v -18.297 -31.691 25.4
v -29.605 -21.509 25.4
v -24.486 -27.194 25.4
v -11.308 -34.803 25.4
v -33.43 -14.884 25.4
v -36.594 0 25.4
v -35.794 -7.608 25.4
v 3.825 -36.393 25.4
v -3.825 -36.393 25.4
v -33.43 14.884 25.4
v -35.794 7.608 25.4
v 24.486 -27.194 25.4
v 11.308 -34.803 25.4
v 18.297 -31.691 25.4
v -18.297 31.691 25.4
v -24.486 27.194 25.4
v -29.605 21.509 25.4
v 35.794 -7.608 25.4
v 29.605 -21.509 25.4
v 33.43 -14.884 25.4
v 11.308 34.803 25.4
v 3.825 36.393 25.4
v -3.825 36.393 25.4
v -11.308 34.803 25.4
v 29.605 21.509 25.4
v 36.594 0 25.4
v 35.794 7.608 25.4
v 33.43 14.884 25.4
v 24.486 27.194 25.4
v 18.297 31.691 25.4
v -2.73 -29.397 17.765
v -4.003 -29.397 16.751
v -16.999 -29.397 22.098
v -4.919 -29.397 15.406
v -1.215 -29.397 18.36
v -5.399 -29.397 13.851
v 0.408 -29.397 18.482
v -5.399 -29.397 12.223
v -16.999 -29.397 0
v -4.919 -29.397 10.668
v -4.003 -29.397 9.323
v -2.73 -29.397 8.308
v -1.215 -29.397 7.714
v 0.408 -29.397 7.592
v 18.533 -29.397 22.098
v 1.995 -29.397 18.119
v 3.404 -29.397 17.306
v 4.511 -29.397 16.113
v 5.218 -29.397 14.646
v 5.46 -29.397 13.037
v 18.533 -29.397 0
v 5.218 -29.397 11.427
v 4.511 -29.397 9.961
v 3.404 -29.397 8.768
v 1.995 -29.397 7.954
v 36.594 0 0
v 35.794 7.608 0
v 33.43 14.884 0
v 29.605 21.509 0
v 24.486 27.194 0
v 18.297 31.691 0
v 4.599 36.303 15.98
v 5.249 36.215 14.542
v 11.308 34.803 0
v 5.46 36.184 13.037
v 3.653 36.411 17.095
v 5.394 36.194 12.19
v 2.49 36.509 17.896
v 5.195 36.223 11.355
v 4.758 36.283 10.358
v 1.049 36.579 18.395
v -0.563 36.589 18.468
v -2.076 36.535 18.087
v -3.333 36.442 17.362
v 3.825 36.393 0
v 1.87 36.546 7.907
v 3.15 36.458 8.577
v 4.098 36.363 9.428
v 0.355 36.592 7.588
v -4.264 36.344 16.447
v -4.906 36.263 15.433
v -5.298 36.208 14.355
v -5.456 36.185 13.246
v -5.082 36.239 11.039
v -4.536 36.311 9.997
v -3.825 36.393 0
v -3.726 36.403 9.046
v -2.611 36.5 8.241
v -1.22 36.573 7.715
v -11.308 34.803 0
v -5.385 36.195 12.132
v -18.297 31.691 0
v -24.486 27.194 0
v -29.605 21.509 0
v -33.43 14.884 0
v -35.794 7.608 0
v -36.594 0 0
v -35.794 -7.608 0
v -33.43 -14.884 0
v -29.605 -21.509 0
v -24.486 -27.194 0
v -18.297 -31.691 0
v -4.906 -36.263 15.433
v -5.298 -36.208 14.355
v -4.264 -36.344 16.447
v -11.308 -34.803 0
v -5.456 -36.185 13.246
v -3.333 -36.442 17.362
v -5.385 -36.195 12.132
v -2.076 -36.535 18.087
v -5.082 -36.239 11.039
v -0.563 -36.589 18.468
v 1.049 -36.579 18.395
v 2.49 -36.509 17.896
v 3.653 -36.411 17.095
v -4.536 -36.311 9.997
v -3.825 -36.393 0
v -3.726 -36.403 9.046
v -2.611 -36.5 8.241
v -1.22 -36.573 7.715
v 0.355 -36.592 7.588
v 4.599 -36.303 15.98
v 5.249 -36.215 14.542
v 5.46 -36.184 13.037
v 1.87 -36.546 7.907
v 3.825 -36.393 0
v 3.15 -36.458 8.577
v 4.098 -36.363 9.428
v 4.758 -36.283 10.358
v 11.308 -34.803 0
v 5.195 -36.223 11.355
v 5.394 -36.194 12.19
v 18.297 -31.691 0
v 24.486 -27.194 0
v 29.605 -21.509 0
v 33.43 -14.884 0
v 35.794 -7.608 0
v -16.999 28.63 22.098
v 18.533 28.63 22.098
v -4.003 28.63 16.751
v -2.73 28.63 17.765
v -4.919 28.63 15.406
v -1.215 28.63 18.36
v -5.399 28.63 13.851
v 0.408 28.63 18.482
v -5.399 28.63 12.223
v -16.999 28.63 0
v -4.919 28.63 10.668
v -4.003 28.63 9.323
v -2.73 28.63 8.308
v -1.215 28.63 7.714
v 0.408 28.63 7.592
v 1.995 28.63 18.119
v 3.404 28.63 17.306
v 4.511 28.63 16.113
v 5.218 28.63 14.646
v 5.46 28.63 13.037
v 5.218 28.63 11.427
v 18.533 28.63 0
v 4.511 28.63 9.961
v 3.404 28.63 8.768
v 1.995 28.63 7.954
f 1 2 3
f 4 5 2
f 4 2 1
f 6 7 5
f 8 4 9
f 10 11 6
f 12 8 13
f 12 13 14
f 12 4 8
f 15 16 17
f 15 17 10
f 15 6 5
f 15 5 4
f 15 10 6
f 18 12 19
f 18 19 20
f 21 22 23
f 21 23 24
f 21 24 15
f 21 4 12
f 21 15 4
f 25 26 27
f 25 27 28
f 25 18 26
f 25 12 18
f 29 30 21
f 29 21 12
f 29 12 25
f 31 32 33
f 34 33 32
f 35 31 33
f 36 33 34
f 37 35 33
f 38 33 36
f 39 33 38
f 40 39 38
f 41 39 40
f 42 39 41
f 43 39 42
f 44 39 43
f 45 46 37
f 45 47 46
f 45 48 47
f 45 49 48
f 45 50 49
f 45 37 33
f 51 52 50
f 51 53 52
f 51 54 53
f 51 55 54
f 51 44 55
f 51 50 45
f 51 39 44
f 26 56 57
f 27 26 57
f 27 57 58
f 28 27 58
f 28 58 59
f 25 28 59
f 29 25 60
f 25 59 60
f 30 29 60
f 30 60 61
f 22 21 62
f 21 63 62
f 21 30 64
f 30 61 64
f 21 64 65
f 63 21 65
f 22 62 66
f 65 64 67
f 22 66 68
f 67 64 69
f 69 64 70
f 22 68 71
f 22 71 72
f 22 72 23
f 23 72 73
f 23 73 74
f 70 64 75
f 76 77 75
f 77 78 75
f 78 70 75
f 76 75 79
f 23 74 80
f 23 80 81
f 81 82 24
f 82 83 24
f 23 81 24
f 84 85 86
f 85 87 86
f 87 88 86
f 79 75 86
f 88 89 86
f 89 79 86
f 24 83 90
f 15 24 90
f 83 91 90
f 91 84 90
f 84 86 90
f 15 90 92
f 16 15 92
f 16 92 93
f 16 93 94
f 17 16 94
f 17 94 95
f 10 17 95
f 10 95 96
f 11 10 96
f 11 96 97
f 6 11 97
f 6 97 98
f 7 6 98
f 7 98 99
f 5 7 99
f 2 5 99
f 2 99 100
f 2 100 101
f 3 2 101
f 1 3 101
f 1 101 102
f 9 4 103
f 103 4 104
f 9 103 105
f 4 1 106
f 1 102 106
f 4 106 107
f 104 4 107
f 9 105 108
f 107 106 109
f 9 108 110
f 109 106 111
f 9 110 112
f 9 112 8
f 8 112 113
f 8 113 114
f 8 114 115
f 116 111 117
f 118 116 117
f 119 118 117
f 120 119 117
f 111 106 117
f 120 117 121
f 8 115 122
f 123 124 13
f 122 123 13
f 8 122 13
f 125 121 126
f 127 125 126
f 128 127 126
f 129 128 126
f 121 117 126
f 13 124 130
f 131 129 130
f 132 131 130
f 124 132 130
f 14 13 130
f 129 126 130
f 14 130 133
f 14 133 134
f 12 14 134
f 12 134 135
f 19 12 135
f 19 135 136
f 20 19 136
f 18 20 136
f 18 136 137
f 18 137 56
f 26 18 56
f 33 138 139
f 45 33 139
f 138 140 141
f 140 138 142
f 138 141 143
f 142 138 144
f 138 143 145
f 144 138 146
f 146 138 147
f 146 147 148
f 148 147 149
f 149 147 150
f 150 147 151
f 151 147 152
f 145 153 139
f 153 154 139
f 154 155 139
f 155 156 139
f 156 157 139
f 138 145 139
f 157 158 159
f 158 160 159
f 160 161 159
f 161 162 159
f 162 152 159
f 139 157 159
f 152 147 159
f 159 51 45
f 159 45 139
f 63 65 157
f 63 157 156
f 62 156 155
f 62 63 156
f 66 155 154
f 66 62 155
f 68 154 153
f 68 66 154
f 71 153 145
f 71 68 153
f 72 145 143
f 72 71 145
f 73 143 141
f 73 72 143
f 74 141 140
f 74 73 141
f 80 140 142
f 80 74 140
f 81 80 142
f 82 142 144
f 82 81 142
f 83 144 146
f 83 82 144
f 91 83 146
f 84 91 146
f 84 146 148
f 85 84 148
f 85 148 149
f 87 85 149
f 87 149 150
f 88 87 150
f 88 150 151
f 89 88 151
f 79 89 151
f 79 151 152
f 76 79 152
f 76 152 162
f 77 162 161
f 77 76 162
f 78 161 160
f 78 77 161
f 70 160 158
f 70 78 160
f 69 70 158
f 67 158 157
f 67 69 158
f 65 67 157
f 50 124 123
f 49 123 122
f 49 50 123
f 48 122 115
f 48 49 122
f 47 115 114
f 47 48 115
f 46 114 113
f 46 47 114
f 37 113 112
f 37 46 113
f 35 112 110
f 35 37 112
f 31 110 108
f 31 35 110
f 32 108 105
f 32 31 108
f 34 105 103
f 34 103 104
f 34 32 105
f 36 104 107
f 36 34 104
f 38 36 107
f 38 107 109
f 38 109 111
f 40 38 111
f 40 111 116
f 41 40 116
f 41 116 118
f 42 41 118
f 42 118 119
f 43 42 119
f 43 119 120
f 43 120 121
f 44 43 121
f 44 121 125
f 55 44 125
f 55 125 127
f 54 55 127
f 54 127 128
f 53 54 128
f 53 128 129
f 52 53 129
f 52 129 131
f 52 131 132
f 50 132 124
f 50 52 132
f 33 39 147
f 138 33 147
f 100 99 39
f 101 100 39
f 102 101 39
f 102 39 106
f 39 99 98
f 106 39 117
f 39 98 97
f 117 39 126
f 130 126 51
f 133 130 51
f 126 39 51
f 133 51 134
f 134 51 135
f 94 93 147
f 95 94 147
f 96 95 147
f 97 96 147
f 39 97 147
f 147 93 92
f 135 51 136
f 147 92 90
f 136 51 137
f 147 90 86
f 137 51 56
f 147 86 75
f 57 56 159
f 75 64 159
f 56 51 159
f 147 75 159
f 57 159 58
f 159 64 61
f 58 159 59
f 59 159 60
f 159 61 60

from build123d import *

# Parameters (mm, degrees)
F0_R     = 36.593619
F1_DEPTH = 25.4
F3_R     = 5.460111
F4_DEPTH = 76.708
F5_W     = 35.531597
F5_H     = 58.026424
F6_DEPTH = 22.098


with BuildPart() as f1:
    # F0 (on Top) → F1 (new body)
    with BuildSketch(Plane.XY):
        Circle(F0_R)
    extrude(amount=F1_DEPTH)

    # F3 (on offset) → F4 (cut)
    with BuildSketch(Plane.XZ.offset(-37.084)):
        with Locations((0, 13.036774)):
            Circle(F3_R)
    extrude(amount=F4_DEPTH, mode=Mode.SUBTRACT)

    # F5 (on Top) → F6 (cut)
    with BuildSketch(Plane.XY):
        with Locations((0.766869, -0.383434)):
            Rectangle(F5_W, F5_H)
    extrude(amount=F6_DEPTH, mode=Mode.SUBTRACT)


solid = f1.part
